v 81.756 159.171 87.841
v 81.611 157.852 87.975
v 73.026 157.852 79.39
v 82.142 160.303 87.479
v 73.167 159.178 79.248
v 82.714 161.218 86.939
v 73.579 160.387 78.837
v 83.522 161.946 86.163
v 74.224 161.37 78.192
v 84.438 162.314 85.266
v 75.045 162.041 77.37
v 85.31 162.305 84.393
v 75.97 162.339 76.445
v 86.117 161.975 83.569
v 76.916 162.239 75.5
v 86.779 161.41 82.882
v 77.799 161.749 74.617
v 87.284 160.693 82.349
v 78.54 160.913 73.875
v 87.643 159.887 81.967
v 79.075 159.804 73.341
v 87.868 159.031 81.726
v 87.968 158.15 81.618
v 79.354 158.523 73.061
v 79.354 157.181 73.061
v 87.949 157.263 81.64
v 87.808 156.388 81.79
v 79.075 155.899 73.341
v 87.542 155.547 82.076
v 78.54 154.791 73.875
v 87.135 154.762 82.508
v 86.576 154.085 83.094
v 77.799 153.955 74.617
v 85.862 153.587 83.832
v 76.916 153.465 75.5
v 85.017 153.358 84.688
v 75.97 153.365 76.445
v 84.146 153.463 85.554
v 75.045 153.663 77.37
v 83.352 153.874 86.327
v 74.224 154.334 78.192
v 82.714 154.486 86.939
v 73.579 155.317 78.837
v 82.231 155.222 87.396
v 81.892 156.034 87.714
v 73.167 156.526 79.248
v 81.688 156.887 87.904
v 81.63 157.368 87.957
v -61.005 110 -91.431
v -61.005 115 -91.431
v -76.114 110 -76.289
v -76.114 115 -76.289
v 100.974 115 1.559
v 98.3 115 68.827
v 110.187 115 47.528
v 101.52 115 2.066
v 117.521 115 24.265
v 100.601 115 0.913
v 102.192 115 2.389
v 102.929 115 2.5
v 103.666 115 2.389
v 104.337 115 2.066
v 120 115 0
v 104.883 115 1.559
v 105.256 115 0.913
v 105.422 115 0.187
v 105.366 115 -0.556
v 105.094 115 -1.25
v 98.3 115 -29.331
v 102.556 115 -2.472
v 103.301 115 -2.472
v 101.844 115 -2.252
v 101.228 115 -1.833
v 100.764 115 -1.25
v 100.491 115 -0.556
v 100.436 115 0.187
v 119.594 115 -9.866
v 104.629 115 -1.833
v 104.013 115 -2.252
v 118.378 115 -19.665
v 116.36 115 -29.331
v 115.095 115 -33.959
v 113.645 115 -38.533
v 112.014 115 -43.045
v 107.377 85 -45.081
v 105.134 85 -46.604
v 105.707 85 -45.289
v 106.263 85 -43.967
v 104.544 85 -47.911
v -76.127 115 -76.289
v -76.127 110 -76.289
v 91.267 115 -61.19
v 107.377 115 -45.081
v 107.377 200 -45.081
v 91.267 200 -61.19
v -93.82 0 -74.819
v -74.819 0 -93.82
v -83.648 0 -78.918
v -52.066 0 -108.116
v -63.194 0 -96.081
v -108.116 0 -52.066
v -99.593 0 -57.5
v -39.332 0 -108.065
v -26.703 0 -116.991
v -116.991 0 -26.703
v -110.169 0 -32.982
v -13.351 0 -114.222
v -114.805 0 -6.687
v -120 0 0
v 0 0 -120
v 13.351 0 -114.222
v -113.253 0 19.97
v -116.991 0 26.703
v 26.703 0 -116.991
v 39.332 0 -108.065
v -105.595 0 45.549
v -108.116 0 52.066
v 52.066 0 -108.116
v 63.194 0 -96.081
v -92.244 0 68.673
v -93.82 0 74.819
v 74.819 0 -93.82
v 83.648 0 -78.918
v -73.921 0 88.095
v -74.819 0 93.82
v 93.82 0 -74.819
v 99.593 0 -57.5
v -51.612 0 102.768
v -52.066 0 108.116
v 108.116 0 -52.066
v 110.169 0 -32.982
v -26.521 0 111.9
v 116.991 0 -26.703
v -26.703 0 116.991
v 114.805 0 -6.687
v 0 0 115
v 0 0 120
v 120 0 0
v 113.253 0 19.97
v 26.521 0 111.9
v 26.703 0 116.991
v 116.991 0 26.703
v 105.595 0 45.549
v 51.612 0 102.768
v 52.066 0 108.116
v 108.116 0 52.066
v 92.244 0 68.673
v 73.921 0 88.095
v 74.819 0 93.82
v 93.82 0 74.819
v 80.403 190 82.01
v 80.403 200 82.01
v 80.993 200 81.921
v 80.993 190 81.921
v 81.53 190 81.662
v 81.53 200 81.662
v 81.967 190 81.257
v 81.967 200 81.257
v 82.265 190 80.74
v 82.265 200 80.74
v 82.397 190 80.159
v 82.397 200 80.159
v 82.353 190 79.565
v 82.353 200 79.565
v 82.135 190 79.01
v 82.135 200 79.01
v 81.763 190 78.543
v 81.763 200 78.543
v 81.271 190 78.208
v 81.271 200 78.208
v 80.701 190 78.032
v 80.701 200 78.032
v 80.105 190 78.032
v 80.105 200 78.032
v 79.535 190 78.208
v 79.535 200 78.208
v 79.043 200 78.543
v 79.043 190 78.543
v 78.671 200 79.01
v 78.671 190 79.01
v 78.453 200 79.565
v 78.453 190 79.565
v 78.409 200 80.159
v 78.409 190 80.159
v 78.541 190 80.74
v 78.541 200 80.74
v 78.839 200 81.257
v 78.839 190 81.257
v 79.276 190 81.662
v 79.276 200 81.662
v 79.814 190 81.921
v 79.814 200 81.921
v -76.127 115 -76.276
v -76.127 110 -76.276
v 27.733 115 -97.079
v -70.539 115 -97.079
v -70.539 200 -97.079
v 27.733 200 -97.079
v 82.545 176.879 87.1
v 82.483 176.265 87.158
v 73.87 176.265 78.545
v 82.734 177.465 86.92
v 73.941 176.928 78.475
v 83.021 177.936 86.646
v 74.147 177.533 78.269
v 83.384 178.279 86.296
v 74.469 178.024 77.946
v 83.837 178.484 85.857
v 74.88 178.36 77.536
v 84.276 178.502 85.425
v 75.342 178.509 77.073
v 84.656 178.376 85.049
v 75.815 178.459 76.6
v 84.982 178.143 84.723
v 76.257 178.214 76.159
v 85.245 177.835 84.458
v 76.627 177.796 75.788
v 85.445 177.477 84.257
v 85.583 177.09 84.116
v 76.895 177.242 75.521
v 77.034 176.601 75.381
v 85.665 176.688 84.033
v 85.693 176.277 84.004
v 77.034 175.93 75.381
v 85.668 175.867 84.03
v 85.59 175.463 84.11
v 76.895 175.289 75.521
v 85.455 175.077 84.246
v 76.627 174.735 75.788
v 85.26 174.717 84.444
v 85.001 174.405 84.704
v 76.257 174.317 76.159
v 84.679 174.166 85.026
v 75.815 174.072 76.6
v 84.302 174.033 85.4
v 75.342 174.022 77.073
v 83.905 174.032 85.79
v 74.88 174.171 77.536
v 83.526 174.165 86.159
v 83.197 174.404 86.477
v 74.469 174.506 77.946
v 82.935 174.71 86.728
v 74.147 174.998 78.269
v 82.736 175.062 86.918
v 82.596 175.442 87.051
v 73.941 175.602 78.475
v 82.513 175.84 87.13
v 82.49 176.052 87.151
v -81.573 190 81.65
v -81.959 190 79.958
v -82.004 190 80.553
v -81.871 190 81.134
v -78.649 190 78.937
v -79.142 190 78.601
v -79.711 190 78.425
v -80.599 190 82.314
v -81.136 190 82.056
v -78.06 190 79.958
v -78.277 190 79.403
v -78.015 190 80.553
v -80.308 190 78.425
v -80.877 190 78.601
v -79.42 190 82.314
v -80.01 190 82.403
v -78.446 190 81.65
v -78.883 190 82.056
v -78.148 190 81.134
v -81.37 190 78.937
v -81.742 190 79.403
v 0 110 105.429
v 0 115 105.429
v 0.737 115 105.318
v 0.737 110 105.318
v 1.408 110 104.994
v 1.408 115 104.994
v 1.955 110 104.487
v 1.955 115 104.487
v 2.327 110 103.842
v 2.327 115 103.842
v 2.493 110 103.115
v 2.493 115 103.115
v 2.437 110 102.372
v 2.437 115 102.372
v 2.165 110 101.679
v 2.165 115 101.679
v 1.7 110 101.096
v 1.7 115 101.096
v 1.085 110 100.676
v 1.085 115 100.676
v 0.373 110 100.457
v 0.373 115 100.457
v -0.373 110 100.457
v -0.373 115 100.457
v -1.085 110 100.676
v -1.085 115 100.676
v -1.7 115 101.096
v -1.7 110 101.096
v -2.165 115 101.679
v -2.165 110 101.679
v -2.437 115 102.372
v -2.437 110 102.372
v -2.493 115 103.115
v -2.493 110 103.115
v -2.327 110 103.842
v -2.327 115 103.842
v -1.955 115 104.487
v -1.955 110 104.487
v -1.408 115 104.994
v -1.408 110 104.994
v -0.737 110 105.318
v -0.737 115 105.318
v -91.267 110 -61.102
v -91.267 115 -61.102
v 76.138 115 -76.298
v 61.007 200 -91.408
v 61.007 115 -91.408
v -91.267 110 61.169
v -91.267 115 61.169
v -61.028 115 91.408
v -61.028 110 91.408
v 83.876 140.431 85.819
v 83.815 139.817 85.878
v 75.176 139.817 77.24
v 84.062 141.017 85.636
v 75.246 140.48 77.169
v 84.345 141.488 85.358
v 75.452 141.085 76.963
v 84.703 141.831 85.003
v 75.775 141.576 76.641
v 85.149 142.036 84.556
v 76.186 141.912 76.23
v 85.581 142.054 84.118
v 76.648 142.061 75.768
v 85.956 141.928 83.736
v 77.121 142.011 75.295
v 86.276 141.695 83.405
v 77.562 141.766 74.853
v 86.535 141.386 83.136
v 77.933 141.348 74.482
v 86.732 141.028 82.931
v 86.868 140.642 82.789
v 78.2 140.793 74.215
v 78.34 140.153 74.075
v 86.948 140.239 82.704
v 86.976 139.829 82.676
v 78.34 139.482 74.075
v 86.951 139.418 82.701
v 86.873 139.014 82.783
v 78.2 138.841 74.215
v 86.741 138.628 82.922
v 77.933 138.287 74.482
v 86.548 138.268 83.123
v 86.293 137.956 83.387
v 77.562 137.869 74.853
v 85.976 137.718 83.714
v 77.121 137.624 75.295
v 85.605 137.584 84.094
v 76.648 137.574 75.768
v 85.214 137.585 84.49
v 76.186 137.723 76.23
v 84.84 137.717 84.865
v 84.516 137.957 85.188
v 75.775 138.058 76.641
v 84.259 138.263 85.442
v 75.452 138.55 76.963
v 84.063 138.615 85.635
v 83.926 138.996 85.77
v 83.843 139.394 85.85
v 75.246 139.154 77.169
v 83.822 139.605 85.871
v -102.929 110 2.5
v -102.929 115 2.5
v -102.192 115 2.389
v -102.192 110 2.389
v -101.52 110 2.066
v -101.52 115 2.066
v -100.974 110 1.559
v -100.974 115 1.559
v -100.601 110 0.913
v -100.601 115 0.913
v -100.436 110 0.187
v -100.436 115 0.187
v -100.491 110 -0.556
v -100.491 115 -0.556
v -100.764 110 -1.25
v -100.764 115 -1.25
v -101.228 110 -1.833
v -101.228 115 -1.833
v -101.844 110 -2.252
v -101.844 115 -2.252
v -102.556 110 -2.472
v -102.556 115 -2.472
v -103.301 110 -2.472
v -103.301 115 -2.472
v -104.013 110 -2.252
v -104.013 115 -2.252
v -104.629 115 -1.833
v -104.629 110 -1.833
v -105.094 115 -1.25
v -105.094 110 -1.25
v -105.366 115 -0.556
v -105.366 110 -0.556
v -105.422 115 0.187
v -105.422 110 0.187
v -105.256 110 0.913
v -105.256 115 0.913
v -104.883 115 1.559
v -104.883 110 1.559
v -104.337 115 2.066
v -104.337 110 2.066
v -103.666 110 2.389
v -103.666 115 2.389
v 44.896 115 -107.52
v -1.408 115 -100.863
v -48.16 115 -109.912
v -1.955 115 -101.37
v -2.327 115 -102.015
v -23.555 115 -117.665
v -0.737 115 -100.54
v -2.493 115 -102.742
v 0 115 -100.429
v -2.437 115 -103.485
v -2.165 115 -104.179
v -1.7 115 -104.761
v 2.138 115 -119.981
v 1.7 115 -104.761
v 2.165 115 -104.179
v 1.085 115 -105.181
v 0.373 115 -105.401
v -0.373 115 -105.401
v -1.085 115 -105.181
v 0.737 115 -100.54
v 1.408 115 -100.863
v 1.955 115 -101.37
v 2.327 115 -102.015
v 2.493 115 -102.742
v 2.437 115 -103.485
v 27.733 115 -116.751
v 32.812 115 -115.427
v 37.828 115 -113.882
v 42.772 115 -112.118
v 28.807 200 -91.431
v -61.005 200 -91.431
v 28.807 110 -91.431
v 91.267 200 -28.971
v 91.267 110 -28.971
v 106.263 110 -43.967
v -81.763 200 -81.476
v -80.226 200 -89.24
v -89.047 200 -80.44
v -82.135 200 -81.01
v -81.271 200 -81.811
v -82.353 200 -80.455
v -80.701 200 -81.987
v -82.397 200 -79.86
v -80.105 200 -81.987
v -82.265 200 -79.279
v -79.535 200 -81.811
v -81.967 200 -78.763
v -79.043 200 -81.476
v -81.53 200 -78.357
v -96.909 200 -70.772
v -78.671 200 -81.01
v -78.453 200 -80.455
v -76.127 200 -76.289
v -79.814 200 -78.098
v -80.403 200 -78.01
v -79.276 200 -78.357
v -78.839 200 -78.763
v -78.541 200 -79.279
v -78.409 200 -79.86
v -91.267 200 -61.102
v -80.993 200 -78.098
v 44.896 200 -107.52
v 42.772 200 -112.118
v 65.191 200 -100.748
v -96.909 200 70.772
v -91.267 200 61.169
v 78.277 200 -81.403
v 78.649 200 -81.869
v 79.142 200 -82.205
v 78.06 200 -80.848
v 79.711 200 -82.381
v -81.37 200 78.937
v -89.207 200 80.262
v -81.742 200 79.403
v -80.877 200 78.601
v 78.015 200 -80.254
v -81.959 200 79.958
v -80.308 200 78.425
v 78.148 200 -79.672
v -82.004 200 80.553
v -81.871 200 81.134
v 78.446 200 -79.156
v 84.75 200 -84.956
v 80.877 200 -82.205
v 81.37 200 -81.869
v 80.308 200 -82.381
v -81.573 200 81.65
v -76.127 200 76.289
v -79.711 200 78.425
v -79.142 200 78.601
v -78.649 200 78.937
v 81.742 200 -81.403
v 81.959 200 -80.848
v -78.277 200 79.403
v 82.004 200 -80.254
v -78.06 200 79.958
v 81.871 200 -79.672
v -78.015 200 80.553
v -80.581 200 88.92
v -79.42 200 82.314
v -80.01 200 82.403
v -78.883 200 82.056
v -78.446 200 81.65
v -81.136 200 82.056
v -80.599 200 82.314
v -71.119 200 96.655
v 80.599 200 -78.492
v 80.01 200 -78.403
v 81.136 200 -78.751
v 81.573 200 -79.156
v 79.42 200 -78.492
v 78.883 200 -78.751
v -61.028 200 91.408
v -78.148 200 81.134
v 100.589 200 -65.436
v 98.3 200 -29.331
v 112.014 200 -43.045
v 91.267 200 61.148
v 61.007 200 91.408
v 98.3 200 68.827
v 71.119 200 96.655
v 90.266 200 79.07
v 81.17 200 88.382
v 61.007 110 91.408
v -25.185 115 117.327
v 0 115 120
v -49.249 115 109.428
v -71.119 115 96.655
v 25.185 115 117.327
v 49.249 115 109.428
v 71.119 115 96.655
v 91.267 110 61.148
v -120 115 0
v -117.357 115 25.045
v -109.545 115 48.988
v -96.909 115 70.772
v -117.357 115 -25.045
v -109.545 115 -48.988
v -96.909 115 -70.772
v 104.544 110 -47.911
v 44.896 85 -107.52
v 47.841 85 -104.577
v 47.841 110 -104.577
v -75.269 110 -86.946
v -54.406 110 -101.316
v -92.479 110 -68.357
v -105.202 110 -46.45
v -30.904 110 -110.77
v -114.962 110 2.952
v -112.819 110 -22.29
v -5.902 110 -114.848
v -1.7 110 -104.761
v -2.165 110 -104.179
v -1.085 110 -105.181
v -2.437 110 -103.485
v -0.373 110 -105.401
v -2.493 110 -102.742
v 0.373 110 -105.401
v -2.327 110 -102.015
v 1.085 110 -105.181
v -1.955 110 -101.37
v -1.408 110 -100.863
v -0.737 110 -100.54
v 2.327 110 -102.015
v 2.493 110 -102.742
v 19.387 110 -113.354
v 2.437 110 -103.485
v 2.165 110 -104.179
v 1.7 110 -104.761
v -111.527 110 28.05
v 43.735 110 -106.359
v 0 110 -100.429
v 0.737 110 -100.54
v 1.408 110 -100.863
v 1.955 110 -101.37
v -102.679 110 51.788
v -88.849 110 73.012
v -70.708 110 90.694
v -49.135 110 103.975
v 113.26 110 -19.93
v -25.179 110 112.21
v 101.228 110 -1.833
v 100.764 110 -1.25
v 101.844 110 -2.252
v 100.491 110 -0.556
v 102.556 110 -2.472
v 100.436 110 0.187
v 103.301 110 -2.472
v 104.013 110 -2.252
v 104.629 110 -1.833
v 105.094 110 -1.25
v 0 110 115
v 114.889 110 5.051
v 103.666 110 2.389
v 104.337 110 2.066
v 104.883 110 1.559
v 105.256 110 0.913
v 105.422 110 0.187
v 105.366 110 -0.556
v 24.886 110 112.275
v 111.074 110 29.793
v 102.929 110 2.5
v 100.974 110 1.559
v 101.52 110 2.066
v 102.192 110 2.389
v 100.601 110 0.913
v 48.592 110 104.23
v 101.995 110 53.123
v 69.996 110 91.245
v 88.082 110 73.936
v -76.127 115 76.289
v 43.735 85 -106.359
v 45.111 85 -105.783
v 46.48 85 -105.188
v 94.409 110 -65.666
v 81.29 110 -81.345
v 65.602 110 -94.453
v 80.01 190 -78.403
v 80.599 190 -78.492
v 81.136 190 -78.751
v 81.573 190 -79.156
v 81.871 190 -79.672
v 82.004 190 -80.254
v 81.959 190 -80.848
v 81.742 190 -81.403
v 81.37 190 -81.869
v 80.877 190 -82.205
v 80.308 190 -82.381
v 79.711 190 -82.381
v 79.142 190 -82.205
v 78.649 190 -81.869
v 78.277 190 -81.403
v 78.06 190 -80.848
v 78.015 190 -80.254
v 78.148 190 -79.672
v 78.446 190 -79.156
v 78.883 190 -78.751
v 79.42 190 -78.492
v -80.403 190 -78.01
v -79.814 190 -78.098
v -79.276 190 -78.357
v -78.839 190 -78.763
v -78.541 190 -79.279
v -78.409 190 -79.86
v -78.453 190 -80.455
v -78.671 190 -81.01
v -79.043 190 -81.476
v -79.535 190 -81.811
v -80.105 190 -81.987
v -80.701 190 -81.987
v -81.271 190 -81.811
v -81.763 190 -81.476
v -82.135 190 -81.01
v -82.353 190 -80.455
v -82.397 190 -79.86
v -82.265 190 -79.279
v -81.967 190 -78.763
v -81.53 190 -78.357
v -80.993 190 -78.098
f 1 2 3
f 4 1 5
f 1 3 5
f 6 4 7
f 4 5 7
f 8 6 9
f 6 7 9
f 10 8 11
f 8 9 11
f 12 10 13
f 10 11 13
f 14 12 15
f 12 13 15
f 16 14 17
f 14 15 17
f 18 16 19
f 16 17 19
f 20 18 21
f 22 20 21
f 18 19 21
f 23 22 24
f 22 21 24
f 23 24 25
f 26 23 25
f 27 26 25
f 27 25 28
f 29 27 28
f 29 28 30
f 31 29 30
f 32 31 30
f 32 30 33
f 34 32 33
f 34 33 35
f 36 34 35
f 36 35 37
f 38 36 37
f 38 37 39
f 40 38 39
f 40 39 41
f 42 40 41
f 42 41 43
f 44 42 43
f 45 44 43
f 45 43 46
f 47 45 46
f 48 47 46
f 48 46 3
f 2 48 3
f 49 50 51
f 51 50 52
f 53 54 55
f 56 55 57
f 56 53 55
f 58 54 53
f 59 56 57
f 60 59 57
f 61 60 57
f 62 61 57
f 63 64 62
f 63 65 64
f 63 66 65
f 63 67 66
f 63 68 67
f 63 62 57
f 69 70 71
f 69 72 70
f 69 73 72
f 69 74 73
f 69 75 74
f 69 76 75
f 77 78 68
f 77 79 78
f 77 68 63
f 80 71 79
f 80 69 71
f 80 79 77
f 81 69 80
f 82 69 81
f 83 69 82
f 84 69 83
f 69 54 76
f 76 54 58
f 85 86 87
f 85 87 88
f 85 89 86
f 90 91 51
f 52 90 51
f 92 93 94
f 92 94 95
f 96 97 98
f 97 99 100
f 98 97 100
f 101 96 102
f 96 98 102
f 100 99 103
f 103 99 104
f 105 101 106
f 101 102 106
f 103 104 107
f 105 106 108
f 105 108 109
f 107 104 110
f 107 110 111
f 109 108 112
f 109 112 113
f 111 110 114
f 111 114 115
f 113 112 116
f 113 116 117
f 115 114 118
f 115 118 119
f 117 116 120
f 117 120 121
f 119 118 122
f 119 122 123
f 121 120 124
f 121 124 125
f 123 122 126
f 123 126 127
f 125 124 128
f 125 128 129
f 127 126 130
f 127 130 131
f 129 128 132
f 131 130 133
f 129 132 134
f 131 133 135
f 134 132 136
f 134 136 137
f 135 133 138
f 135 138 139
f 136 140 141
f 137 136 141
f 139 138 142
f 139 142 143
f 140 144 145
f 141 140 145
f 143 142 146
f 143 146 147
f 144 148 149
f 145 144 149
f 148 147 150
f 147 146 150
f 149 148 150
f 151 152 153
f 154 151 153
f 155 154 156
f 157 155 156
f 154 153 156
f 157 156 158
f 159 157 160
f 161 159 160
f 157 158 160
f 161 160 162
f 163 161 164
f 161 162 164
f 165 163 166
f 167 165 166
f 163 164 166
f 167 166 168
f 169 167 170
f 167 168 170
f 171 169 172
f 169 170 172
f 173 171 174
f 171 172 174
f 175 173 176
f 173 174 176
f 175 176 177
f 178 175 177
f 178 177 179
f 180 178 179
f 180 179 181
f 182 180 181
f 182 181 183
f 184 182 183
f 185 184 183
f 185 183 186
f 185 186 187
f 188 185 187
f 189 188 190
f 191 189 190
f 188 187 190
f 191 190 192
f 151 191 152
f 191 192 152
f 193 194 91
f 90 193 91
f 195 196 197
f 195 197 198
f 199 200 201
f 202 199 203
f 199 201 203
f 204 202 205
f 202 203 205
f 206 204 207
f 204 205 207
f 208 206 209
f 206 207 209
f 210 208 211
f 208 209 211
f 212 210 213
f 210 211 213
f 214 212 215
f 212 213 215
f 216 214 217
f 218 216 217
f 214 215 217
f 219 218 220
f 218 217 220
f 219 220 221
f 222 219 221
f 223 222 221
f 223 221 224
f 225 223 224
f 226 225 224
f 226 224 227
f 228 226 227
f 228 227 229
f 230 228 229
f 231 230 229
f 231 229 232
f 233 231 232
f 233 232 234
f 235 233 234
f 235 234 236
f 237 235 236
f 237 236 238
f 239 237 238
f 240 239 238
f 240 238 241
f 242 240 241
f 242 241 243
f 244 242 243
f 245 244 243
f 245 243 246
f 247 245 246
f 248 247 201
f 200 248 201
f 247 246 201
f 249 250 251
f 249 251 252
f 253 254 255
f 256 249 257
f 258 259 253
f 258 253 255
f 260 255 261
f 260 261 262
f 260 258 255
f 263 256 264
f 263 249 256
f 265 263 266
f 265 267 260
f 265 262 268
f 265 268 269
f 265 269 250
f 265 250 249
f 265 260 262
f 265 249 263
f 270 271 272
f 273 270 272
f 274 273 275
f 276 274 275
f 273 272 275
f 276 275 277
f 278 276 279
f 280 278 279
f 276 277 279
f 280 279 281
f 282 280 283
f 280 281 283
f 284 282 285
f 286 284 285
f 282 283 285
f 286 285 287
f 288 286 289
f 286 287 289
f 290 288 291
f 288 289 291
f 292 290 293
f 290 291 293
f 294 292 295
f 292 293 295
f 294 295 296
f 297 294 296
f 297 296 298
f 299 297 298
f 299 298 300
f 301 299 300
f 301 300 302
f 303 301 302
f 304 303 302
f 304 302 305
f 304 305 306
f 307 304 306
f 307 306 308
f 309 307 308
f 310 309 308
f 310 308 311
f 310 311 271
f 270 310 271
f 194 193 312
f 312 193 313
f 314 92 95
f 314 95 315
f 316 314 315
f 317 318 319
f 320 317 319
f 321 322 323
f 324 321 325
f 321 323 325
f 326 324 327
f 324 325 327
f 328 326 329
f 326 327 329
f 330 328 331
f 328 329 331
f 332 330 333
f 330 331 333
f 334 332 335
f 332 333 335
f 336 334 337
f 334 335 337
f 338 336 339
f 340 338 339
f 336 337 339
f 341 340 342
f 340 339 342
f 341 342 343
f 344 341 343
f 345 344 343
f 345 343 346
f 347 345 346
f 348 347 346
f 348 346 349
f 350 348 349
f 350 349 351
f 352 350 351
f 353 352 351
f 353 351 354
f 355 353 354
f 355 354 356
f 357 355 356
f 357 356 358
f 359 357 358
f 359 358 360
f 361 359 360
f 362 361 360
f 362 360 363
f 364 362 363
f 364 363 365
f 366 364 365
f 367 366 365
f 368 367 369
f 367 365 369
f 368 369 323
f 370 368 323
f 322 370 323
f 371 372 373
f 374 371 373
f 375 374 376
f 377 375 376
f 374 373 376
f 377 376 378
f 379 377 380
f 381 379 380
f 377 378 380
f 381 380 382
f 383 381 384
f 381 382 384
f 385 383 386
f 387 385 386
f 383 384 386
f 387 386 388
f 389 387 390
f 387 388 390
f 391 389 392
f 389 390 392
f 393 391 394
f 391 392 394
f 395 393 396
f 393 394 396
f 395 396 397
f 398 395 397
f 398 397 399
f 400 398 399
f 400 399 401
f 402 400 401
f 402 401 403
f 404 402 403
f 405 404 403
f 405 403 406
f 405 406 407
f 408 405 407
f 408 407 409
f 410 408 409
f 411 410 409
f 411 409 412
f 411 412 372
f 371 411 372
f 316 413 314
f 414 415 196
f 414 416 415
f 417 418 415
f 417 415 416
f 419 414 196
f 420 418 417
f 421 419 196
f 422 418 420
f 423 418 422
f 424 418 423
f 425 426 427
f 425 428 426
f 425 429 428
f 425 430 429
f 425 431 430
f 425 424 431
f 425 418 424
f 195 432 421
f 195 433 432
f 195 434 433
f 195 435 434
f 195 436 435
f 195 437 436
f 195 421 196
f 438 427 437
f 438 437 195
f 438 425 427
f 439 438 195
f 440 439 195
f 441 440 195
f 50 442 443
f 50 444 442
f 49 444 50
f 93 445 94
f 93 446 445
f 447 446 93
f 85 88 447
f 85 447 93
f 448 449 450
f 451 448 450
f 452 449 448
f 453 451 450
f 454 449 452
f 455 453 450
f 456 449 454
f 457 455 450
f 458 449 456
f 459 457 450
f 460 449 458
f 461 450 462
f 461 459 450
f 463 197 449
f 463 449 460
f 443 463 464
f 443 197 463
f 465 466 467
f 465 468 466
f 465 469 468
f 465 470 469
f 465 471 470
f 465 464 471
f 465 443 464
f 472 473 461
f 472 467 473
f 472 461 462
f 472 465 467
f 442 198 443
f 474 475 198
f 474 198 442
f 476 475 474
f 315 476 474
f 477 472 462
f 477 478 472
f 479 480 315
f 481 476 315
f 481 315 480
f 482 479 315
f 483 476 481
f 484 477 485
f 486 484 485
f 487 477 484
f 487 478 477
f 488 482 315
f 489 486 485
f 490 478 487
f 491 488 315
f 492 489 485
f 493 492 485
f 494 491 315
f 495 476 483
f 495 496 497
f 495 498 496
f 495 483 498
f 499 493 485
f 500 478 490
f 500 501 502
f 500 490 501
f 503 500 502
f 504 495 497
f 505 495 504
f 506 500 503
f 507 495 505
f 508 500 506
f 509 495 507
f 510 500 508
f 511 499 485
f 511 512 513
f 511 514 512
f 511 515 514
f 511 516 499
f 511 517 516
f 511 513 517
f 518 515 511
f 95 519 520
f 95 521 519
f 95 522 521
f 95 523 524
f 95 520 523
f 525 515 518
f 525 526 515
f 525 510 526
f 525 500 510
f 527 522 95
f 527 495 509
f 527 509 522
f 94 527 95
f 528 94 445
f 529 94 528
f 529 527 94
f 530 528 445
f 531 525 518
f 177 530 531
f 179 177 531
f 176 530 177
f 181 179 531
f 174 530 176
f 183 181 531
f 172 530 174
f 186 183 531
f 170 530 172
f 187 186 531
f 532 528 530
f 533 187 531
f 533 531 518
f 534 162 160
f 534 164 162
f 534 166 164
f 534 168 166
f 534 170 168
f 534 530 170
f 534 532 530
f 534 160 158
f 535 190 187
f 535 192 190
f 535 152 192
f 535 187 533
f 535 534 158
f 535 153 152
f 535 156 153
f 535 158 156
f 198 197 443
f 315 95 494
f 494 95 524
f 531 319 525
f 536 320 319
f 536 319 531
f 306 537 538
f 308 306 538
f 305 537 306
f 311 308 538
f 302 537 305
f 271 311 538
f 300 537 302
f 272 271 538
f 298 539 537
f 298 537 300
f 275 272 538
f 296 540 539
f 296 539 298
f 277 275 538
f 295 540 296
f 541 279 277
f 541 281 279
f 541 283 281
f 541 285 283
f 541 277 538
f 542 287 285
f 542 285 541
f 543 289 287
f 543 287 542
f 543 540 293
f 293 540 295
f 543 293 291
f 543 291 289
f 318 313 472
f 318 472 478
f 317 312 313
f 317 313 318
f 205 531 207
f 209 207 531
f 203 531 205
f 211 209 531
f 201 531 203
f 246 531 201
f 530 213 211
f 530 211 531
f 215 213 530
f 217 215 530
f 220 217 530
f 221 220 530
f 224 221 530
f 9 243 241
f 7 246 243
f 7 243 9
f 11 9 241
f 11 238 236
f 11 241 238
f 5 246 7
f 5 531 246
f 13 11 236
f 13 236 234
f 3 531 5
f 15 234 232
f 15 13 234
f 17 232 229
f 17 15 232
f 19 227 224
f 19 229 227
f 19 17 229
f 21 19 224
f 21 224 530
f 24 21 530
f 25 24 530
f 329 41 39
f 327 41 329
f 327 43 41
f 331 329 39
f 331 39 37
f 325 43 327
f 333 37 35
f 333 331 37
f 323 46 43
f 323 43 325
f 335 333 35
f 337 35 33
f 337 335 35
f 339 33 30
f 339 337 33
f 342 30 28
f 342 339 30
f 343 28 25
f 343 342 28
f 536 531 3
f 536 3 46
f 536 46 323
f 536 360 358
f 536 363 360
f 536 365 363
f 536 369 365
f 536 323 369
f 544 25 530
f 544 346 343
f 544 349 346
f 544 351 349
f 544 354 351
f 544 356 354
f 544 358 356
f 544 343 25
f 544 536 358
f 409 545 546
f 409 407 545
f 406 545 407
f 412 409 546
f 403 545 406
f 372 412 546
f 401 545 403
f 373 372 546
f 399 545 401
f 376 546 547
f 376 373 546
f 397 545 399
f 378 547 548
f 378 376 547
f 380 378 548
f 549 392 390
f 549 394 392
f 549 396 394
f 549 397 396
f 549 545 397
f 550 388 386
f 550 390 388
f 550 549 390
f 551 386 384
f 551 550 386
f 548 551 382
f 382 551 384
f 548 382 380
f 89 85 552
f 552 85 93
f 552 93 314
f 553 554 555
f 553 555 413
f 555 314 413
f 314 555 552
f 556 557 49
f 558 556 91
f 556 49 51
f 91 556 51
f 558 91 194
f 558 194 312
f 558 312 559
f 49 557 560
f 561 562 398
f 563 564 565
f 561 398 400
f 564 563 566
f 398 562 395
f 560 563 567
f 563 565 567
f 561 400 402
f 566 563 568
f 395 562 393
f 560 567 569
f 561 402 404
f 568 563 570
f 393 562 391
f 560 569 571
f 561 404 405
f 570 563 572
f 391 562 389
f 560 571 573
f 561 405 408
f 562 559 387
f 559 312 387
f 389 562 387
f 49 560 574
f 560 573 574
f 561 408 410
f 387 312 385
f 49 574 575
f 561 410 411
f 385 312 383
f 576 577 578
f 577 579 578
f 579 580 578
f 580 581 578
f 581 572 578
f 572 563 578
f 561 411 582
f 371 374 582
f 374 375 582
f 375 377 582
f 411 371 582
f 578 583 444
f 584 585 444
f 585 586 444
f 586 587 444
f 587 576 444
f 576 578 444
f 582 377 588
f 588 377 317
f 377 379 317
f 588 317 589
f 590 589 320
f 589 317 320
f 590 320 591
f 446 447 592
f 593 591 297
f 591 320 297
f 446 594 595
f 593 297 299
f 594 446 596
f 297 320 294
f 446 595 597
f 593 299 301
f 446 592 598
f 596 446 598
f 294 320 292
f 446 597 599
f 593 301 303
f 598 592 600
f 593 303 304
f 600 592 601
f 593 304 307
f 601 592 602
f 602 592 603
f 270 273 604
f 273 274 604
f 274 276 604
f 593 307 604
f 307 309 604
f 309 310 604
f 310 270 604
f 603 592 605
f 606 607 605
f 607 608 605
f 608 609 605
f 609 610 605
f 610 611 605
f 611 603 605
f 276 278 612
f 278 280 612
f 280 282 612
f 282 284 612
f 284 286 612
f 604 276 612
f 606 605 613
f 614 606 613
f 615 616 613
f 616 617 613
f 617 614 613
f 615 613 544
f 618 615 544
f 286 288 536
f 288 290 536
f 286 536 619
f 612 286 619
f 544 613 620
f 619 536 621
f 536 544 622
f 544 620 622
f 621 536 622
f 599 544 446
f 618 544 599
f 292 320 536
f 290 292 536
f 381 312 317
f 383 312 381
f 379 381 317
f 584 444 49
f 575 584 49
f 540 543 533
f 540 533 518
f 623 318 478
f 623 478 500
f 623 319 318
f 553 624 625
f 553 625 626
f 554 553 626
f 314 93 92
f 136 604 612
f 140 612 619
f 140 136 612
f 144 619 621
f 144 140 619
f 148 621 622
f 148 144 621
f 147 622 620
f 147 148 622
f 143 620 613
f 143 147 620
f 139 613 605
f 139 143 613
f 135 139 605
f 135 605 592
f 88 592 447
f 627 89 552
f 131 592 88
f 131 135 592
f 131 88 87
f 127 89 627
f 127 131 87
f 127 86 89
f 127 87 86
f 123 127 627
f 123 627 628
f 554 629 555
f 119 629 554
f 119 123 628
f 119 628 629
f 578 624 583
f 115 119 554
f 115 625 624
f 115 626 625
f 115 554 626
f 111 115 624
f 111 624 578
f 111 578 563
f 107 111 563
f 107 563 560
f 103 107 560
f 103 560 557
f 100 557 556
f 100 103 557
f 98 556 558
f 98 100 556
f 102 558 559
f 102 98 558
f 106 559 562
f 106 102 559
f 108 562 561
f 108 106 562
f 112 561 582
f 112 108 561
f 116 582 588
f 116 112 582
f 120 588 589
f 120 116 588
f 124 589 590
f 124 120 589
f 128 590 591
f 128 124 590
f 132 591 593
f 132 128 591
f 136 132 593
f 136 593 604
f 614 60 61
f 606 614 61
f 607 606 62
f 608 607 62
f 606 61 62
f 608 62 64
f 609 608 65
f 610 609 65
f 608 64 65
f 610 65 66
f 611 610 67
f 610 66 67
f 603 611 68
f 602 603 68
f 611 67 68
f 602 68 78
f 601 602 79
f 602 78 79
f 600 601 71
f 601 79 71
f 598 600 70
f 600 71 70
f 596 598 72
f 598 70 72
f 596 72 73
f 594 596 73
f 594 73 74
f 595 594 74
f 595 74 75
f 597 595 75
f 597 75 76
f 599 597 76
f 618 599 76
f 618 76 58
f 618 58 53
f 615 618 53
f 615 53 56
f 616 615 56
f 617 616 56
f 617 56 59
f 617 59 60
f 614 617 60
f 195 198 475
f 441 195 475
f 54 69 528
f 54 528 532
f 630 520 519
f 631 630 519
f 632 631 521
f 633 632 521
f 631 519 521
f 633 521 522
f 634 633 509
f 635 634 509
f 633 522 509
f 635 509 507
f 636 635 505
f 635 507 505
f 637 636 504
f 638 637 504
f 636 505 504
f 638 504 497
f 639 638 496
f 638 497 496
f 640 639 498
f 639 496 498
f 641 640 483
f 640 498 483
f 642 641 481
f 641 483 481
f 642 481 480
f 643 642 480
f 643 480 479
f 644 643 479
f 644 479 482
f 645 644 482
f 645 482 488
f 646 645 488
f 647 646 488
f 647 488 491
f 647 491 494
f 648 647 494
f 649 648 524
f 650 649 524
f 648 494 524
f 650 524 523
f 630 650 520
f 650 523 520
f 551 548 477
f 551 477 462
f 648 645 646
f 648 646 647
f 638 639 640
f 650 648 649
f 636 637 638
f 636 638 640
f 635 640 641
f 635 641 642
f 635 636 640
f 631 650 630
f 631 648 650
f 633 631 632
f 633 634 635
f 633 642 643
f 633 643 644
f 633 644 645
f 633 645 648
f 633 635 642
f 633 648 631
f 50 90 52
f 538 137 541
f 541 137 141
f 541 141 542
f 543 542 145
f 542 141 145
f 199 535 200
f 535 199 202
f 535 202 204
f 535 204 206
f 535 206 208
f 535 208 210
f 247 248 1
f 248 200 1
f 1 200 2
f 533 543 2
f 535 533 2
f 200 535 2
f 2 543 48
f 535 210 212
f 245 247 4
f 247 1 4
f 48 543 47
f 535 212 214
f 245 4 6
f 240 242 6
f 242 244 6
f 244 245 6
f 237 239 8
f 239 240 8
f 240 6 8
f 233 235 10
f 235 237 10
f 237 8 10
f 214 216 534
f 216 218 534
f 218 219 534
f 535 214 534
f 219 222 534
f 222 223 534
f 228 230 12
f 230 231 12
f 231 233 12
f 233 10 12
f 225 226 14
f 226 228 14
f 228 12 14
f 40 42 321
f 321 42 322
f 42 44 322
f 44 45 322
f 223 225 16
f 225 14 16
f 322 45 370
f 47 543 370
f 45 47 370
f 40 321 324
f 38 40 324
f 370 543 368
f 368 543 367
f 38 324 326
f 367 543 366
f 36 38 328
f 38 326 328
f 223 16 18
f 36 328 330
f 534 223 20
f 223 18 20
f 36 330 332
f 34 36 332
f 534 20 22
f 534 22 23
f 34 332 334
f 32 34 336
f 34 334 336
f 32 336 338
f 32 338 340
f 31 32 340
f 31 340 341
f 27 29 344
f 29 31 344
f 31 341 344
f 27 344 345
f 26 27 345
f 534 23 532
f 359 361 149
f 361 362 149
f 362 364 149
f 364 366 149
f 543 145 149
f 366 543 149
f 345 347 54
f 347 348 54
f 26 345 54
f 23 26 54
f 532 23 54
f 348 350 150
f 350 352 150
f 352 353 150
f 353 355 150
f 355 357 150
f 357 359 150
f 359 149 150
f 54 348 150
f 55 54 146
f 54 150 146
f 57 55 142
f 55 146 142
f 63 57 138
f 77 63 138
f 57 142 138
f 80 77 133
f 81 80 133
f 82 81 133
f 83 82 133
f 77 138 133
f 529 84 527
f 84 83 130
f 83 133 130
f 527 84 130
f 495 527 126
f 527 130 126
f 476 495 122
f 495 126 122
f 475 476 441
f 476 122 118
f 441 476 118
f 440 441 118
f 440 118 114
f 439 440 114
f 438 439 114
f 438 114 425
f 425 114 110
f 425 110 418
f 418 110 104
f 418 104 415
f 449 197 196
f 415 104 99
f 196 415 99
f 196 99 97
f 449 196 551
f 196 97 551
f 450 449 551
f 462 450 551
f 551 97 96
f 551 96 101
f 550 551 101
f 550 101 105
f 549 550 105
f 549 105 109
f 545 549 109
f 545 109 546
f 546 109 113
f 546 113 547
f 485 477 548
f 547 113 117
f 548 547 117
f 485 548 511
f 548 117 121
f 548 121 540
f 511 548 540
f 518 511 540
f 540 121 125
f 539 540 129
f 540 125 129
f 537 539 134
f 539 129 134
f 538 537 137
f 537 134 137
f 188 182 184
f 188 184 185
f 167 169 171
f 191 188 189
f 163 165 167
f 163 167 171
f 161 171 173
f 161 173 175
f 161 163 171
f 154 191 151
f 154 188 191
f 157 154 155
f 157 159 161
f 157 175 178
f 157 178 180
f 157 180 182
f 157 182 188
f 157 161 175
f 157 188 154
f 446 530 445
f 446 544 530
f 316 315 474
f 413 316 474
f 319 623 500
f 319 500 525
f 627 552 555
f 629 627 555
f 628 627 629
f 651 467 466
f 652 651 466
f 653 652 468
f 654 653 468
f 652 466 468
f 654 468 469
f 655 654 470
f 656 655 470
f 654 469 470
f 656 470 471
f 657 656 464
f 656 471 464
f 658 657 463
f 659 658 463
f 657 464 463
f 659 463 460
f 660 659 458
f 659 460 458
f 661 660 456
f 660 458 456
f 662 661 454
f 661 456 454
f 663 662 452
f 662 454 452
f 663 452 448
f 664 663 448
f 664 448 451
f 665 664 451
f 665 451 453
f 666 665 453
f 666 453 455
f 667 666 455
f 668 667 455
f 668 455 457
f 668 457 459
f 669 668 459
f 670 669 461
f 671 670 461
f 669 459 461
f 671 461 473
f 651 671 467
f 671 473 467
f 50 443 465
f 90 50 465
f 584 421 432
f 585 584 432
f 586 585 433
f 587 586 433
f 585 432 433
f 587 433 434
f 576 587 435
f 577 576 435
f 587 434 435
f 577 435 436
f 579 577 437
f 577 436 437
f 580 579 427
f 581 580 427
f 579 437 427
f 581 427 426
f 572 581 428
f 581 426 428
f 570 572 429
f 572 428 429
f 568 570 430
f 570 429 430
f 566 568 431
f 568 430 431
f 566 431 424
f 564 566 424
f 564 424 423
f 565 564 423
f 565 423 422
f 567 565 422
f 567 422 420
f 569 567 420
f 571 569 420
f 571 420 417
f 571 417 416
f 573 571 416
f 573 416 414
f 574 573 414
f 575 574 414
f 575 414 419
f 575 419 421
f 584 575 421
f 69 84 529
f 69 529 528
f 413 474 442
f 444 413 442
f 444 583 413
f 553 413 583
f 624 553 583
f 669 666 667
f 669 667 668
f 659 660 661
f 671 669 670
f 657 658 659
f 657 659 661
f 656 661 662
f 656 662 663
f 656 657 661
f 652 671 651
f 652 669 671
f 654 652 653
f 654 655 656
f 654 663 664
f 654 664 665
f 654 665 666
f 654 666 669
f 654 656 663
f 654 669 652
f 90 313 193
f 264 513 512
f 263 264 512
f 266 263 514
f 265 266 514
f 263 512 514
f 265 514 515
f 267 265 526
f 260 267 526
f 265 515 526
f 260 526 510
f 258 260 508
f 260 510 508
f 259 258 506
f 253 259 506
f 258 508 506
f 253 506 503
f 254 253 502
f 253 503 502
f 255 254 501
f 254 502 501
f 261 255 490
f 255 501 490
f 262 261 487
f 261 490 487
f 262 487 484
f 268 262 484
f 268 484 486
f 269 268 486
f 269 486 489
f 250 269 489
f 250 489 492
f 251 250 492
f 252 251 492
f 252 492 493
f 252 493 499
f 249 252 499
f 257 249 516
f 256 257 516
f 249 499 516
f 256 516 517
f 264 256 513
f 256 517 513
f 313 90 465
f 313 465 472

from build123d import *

# Parameters (mm, degrees)
CROQUIS1_R              = 120
CROQUIS1_R_2            = 115
SALIENTE_EXTRUIR1_DEPTH = 110
CROQUIS2_R              = 120
CROQUIS2_W              = 152.253442708
CROQUIS2_H              = 152.577386202
SALIENTE_EXTRUIR2_DEPTH = 90
CORTAR_EXTRUIR1_START   = -85
CORTAR_EXTRUIR1_DEPTH   = 85
CORTAR_EXTRUIR2_DEPTH   = 30
CROQUIS5_R              = 2
CORTAR_EXTRUIR3_DEPTH   = 10
CROQUIS7_R              = 4.5
CORTAR_EXTRUIR4_DEPTH   = 343.045214483
CROQUIS8_R              = 2.25
CORTAR_EXTRUIR5_DEPTH   = 30
CROQUIS12_R             = 2.5
CORTAR_EXTRUIR7_DEPTH   = 15


with BuildPart() as part:
    # Croquis1 → Saliente-Extruir1 (new body)
    with BuildSketch(Plane(origin=(0, 0, 0), x_dir=(1, 0, 0), z_dir=(0, 1, 0))):
        with Locations(Location((0, 0, 0), (0, 0, 270))):
            Circle(CROQUIS1_R)
        with Locations(Location((0, 0, 0), (0, 0, 270))):
            Circle(CROQUIS1_R_2, mode=Mode.SUBTRACT)
    extrude(amount=SALIENTE_EXTRUIR1_DEPTH)

    # Croquis2 → Saliente-Extruir2 (add)
    with BuildSketch(Plane(origin=(0, 110, 0), x_dir=(1, 0, 0), z_dir=(0, 1, 0))):
        with Locations(Location((0, 0, 0), (0, 0, 270))):
            Circle(CROQUIS2_R)
        Rectangle(CROQUIS2_W, CROQUIS2_H, mode=Mode.SUBTRACT)
    extrude(amount=SALIENTE_EXTRUIR2_DEPTH)

    # Croquis3 → Cortar-Extruir1 (cut)
    with BuildSketch(Plane(origin=(0, 200, 0), x_dir=(1, 0, 0), z_dir=(0, 1, 0)).offset(CORTAR_EXTRUIR1_START)):
        Polygon((-45.841188947, 76.288693101), (43.949902098, 76.288693101), (28.807150506, 91.431444693), (-61.004991492, 91.431444693), align=None)
        Polygon((-91.267423391, -61.169009949), (-76.126721354, -46.007259807), (-76.126721354, 45.961058747), (-91.267423391, 61.101790004), align=None)
        Polygon((-61.028027907, -91.408376254), (61.007038201, -91.408376254), (45.887355048, -76.288693101), (-45.887325869, -76.288693101), align=None)
        Polygon((76.126721354, -46.007289027), (91.267423391, -61.147991064), (91.267423391, 28.971171808), (76.126721354, 44.111873845), align=None)
        with BuildLine():
            Line((98.300064852, 29.330876538), (98.300064852, -68.82657372))
            ThreePointArc((98.300064852, -68.82657372), (114.446511048, -36.083183186), (120, 0))
            ThreePointArc((120, 0), (119.08657738, 14.777925699), (116.360215201, 29.330876538))
            Line((116.360215201, 29.330876538), (98.300064852, 29.330876538))
        make_face()
        with BuildLine():
            Line((71.118639022, -96.654742169), (-71.118639022, -96.654742169))
            ThreePointArc((-71.118639022, -96.654742169), (0, -120), (71.118639022, -96.654742169))
        make_face()
        with BuildLine():
            Line((-96.908612184, -70.772317219), (-96.908612184, 70.772317219))
            ThreePointArc((-96.908612184, 70.772317219), (-120, 0), (-96.908612184, -70.772317219))
        make_face()
        with BuildLine():
            ThreePointArc((27.732572497, 116.751464328), (-23.555261835, 117.665413949), (-70.538900009, 97.078646393))
            Line((-70.538900009, 97.078646393), (27.732572497, 97.078646393))
            Line((27.732572497, 97.078646393), (27.732572497, 116.751464328))
        make_face()
        Polygon((76.126721354, 44.111873845), (91.267423391, 28.971171808), (107.376851904, 45.080600321), (91.267423391, 61.190028833), (61.007038201, 91.408376254), (44.895560134, 107.519854321), (28.807150506, 91.431444693), (43.949902098, 76.288693101), (76.126721354, 76.288693101), align=None)
        Polygon((61.007038201, -91.408376254), (76.126721354, -76.288693101), (45.887355048, -76.288693101), align=None)
        Polygon((76.126721354, -46.007289027), (76.126721354, -76.288693101), (91.267423391, -61.147991064), align=None)
        Polygon((-91.267423391, -61.169009949), (-76.126721354, -76.288693101), (-76.126721354, -46.007259807), align=None)
        Polygon((-76.126721354, -76.288693101), (-61.028027907, -91.408376254), (-45.887325869, -76.288693101), align=None)
        Polygon((-91.267423391, 61.101790004), (-76.126721354, 45.961058747), (-76.126721354, 76.288693101), align=None)
        Polygon((-76.126721354, 76.288693101), (-45.841188947, 76.288693101), (-61.004991492, 91.431444693), align=None)
        with BuildLine():
            Line((27.732572497, 116.751464328), (27.732572497, 97.078646393))
            Line((27.732572497, 97.078646393), (42.772301896, 112.118375793))
            ThreePointArc((42.772301896, 112.118375793), (35.32846877, 114.68173043), (27.732572497, 116.751464328))
        make_face()
        with BuildLine():
            ThreePointArc((116.360215201, 29.330876538), (114.392817368, 36.253045866), (112.014025768, 43.044837453))
            Line((112.014025768, 43.044837453), (98.300064852, 29.330876538))
            Line((98.300064852, 29.330876538), (116.360215201, 29.330876538))
        make_face()
    extrude(amount=CORTAR_EXTRUIR1_DEPTH, mode=Mode.SUBTRACT)

    # Croquis4 → Cortar-Extruir2 (cut)
    with BuildSketch(Plane(origin=(0, 115, 0), x_dir=(1, 0, 0), z_dir=(0, 1, 0))):
        Polygon((-91.267423391, 61.101790004), (-91.267423391, -61.169009949), (-61.028027907, -91.408376254), (61.007038201, -91.408376254), (91.267423391, -61.147991064), (91.267423391, 28.971171808), (107.376851904, 45.080600321), (44.895560134, 107.519854321), (28.807150506, 91.431444693), (-61.004991492, 91.431444693), align=None)
    extrude(amount=-CORTAR_EXTRUIR2_DEPTH, mode=Mode.SUBTRACT)

    # Croquis5 → Cortar-Extruir3 (cut)
    with BuildSketch(Plane(origin=(0, 200, 0), x_dir=(1, 0, 0), z_dir=(0, 1, 0))):
        with Locations(Location((80.009543849, 80.403081156, 0), (0, 0, 270))):
            Circle(CROQUIS5_R)
        with Locations(Location((-80.403081156, 80.009543849, 0), (0, 0, 270))):
            Circle(CROQUIS5_R)
        with Locations(Location((-80.009543849, -80.403081156, 0), (0, 0, 270))):
            Circle(CROQUIS5_R)
        with Locations(Location((80.403081156, -80.009543849, 0), (0, 0, 270))):
            Circle(CROQUIS5_R)
    extrude(amount=-CORTAR_EXTRUIR3_DEPTH, mode=Mode.SUBTRACT)

    # Croquis7 → Cortar-Extruir4 (cut, through all)
    with BuildSketch(Plane(origin=(76.207707227, 0, 76.207707227), x_dir=(-0.7071067811865415, 0, 0.7071067811865537), z_dir=(-0.7071067811865537, 0, -0.7071067811865415))):
        with Locations((0, 157.851936769)):
            Circle(CROQUIS7_R)
    extrude(amount=-CORTAR_EXTRUIR4_DEPTH, mode=Mode.SUBTRACT)

    # Croquis8 → Cortar-Extruir5 (cut)
    with BuildSketch(Plane(origin=(76.207707227, 0, 76.207707227), x_dir=(-0.7071067811865415, 0, 0.7071067811865537), z_dir=(-0.7071067811865537, 0, -0.7071067811865415))):
        with Locations((1.055799094, 176.265297527)):
            Circle(CROQUIS8_R)
        with Locations((-0.790662854, 139.817237098)):
            Circle(CROQUIS8_R)
    extrude(amount=-CORTAR_EXTRUIR5_DEPTH, mode=Mode.SUBTRACT)

    # Croquis12 → Cortar-Extruir7 (cut)
    with BuildSketch(Plane(origin=(0, 115, 0), x_dir=(1, 0, 0), z_dir=(0, 1, 0))):
        with Locations(Location((102.928666222, 0, 0), (0, 0, 270))):
            Circle(CROQUIS12_R)
        with Locations(Location((0, -102.928666222, 0), (0, 0, 270))):
            Circle(CROQUIS12_R)
        with Locations(Location((-102.928666222, 0, 0), (0, 0, 270))):
            Circle(CROQUIS12_R)
        with Locations(Location((0, 102.928666222, 0), (0, 0, 270))):
            Circle(CROQUIS12_R)
    extrude(amount=-CORTAR_EXTRUIR7_DEPTH, mode=Mode.SUBTRACT)


solid = part.part
